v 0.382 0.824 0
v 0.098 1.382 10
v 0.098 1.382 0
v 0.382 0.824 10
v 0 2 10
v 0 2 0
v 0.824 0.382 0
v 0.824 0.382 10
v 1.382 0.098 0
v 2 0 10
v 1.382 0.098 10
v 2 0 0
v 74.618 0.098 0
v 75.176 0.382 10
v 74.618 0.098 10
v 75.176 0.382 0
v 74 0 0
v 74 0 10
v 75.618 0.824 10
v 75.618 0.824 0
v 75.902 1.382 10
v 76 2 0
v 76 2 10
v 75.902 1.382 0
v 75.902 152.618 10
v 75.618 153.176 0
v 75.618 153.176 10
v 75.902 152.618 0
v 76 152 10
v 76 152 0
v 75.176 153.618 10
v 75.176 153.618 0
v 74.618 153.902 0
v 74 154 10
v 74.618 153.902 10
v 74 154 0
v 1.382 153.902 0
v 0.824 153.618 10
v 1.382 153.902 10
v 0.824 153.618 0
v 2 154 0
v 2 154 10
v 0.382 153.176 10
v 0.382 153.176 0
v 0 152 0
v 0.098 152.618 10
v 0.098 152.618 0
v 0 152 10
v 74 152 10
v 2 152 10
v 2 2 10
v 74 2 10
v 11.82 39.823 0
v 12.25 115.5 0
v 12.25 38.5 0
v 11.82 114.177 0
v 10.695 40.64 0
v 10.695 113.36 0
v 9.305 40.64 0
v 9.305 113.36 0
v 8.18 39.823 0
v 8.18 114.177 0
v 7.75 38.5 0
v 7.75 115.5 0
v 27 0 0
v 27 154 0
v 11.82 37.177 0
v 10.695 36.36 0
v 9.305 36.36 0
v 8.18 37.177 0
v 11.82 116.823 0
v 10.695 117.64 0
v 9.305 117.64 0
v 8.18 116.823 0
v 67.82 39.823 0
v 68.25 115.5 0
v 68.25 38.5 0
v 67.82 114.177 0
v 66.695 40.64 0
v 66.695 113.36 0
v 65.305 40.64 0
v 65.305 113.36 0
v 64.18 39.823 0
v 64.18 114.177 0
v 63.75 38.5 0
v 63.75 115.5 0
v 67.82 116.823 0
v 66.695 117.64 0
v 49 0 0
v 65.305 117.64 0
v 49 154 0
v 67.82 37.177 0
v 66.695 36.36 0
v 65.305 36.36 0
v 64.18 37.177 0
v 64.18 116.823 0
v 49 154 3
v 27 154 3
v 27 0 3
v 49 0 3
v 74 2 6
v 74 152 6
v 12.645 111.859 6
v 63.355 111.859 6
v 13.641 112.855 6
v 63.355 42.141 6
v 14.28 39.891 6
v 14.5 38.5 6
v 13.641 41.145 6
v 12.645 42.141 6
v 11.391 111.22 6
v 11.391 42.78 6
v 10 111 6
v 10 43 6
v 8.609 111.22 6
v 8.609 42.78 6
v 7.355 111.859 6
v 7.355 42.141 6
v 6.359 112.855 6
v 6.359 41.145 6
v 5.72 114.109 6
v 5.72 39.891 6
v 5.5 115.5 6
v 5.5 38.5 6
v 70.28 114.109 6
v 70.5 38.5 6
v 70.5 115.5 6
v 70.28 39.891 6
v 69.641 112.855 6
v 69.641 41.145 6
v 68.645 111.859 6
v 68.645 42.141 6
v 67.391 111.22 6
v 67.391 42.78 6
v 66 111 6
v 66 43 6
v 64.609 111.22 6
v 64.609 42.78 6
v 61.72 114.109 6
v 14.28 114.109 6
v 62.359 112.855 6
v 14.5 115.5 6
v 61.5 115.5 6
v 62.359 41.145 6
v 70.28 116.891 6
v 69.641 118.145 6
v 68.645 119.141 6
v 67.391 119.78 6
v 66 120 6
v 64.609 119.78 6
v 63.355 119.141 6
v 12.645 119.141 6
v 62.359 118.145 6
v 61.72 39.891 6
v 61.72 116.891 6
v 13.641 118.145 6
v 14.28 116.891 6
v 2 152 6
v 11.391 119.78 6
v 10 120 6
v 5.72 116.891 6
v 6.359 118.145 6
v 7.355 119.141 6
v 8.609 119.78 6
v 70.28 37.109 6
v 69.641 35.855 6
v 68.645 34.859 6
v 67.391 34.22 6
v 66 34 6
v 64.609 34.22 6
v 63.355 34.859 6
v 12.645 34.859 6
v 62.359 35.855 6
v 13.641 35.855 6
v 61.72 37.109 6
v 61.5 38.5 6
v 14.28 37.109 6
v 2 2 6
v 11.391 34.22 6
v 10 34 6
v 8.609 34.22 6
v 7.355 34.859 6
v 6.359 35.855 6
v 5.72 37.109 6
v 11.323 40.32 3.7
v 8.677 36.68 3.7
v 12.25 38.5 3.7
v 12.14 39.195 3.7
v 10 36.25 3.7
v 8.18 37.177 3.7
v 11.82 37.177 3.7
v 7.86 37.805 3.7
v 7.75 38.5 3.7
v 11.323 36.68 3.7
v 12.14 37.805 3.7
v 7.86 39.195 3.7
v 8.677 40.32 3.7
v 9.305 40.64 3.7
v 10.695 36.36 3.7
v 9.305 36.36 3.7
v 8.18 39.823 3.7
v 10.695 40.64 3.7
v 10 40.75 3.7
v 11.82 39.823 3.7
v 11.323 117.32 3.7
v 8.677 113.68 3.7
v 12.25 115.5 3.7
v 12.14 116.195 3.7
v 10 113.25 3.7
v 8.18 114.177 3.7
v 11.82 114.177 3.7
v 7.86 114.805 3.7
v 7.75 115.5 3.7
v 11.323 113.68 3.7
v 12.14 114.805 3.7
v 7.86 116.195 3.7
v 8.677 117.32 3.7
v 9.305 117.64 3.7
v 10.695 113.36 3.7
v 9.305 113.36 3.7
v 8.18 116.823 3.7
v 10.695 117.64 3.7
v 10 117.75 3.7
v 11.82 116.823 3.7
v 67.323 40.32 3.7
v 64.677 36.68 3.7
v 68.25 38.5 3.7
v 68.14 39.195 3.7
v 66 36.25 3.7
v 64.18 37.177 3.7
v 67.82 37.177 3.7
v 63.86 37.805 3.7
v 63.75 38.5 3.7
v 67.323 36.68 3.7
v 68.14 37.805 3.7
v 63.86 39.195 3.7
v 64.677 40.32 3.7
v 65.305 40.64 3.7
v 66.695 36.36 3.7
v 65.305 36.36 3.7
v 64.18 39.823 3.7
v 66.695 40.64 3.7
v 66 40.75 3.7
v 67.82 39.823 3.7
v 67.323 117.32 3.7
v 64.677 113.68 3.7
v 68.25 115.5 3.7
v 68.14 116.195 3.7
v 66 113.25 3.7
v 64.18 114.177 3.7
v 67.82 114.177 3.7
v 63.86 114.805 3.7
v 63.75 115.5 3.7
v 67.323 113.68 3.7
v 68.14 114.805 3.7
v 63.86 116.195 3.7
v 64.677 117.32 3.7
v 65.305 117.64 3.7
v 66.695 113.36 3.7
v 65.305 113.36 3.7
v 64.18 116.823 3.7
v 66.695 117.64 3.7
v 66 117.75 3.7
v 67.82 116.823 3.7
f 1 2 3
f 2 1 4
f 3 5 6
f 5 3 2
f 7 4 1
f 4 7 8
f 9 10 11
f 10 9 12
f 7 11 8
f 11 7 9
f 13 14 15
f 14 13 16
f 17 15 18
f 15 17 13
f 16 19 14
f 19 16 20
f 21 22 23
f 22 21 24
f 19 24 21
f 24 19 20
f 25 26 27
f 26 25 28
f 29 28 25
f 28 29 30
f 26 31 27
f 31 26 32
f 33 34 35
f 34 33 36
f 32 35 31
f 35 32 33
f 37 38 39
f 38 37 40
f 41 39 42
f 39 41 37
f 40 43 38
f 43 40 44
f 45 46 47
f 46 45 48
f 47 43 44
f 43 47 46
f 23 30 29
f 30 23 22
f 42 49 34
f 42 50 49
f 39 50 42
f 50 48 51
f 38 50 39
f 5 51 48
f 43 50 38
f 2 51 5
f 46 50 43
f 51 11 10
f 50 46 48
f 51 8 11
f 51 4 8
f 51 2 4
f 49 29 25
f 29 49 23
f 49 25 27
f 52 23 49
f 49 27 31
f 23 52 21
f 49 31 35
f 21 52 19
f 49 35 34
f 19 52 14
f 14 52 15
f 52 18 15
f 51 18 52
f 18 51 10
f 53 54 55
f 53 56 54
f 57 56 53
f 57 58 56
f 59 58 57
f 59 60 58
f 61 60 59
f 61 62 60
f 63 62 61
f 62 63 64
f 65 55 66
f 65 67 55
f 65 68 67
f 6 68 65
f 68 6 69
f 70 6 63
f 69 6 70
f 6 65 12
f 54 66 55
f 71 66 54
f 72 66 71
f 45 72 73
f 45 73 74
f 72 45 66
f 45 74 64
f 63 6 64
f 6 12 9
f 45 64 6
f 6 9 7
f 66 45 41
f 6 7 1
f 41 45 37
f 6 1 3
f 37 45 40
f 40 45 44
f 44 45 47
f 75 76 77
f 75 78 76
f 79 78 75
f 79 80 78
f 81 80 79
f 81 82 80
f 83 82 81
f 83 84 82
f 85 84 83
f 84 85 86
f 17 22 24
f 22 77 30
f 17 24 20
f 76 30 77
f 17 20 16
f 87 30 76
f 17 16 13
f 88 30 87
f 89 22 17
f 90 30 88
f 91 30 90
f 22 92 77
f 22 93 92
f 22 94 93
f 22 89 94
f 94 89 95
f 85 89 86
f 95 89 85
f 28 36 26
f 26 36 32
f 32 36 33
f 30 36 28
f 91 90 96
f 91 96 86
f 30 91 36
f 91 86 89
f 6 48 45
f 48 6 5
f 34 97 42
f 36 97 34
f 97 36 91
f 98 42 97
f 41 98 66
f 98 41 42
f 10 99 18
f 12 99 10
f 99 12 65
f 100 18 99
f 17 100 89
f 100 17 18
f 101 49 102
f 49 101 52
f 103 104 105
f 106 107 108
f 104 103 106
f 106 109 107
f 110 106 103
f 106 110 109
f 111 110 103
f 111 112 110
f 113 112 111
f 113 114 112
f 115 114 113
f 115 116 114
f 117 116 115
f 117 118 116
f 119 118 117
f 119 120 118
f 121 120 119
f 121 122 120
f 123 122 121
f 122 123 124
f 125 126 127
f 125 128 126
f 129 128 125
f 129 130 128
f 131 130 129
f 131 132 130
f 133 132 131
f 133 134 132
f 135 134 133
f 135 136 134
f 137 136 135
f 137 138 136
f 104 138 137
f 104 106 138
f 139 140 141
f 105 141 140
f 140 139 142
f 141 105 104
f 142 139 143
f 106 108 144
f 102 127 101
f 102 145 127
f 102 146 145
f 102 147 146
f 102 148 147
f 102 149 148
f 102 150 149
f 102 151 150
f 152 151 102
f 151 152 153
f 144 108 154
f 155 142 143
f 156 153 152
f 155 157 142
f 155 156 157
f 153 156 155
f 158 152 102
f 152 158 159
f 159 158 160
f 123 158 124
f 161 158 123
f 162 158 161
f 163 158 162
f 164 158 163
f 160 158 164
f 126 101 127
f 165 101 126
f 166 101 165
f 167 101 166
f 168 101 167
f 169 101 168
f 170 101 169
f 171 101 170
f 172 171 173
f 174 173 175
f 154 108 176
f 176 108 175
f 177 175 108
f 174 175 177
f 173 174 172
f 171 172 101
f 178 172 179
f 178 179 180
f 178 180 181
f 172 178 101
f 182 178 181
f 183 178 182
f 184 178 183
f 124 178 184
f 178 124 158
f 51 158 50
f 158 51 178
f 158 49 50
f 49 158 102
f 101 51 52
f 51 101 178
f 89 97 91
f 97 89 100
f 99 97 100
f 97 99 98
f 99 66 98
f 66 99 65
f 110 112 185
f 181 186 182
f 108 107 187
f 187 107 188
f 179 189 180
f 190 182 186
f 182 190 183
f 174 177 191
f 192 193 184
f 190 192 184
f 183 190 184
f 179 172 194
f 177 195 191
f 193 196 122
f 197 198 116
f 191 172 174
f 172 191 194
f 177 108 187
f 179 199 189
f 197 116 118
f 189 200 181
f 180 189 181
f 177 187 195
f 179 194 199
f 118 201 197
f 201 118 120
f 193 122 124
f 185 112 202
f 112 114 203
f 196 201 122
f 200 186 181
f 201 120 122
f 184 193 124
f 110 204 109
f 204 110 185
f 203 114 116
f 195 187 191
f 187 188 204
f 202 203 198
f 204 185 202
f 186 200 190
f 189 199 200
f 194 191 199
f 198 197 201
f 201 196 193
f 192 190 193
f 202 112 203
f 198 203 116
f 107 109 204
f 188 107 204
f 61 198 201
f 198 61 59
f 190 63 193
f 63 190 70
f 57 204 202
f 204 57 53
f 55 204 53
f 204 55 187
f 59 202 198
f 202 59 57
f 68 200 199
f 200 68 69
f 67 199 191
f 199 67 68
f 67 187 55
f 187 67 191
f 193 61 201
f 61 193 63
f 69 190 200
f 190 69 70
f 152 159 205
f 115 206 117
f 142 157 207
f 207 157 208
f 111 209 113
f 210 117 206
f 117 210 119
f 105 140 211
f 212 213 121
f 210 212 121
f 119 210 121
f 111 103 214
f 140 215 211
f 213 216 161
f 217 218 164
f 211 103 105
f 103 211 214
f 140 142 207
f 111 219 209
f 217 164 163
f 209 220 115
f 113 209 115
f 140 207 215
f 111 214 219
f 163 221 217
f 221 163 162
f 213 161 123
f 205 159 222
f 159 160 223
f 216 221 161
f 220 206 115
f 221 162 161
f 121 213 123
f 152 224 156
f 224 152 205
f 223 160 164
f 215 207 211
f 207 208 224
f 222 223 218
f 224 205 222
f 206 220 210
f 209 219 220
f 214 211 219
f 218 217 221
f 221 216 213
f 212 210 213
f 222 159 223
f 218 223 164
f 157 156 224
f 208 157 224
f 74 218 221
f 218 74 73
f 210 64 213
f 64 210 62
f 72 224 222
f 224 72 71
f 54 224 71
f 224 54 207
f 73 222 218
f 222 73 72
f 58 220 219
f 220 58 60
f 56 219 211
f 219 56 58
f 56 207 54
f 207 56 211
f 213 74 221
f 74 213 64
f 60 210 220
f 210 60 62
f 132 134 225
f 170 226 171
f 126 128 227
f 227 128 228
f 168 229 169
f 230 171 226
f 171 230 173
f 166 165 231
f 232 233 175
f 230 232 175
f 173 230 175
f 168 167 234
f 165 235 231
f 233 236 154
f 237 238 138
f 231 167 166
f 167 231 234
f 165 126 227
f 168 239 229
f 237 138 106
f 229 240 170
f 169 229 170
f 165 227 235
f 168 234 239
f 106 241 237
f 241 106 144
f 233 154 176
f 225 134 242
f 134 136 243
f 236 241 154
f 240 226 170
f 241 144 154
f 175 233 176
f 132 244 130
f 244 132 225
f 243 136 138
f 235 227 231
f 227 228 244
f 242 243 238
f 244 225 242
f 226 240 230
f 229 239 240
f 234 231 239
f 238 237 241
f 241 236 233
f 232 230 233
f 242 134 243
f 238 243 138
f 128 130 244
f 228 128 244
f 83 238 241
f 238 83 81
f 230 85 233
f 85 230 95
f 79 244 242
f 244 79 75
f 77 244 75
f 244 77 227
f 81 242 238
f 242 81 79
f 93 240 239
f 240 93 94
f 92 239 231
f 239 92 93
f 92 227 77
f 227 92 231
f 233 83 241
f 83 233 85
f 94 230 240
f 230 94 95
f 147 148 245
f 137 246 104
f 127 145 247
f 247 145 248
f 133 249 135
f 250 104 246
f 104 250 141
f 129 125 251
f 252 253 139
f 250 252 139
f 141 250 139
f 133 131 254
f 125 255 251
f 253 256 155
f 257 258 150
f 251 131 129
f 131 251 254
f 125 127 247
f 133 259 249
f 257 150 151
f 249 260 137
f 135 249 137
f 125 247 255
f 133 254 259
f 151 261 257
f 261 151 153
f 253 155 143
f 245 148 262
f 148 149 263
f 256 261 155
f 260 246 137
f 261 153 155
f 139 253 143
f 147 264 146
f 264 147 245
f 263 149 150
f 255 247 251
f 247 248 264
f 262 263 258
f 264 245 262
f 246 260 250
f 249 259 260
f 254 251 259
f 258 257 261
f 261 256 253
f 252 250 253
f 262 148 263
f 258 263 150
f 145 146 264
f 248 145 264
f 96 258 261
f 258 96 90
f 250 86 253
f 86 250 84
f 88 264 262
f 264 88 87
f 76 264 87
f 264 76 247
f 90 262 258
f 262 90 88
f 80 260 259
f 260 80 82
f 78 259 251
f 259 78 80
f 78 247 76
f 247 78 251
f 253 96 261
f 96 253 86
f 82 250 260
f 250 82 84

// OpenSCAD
// file: modules/Modules.scad
/***************************************
*   Purpose:	Regular use modules
***************************************/

//screwHole();
module screwHole(screwHole=4.5, screwDepth = 10, screwHead = 9, headTaper = 2.3, screwHeadDepth = 5){
	// Common size screws
	
    translate([0,0,-headTaper])cylinder(d1=screwHole, d2=screwHead, h = headTaper, $fn=20);
    translate([0,0,-headTaper-screwDepth])cylinder(d=screwHole, h=screwDepth, $fn=10);
    translate([0,0,-headTaper-screwDepth])cylinder(d=screwHole, h=screwDepth, $fn=10);
    translate([0,0,0]) cylinder(d=screwHead, h=screwHeadDepth, $fn=10);
}

//roundedCube(x=50, y=30, z=20, r=5, xyz="x");
//roundedCube(x=50, y=30, z=20, r=5, xyz="y");
//roundedCube(x=50, y=30, z=20, r=5, xyz="z");
//roundedCube(x=50, y=30, z=20, r=5, xyz="all");
//roundedCylinder(d=200, h=100, r=5);
module roundedCube(x=50, y=30, z=20, r=5, xyz="z"){
	hull(){
		if (xyz == "z") {
			translate([r,r,0])cylinder(h=z, r=r);
			translate([x-r,r,0])cylinder(h=z, r=r);
			translate([r,y-r,0])cylinder(h=z, r=r);
			translate([x-r,y-r,0])cylinder(h=z, r=r);
		} else if (xyz == "y") {
			translate([r,0,r])rotate([-90,0,0])cylinder(h=y, r=r);
			translate([x-r,0,r])rotate([-90,0,0])cylinder(h=y, r=r);
			translate([r,0,z-r])rotate([-90,0,0])cylinder(h=y, r=r);
			translate([x-r,0,z-r])rotate([-90,0,0])cylinder(h=y, r=r);
		} else if (xyz == "x") {
			translate([0,r,r])rotate([0,90,0])cylinder(h=x, r=r);
			translate([0,y-r,r])rotate([0,90,0])cylinder(h=x, r=r);
			translate([0,r,z-r])rotate([0,90,0])cylinder(h=x, r=r);
			translate([0,y-r,z-r])rotate([0,90,0])cylinder(h=x, r=r);
		} else if (xyz == "all") {
			minkowski(){
				translate([r,r,r])cube([x-r*2,y-r*2,z-r*2]);
				sphere(r=r);
			}			
		} else { 
			echo("XYZ not set");
		}
	}
}

//roundedCylinder(d=200, h=100, r=5);
//difference(){roundedCylinder();filletedCylinder();}
module roundedCylinder(d=200, h=100, r=5){
	hull(){
		translate([0,0,r])rotate_extrude()translate([d/2-r,0,0])circle(r=r);
		translate([0,0,h-r])rotate_extrude()translate([d/2-r,0,0])circle(r=r);
	}
}

//filletedCylinder();
//filletedCylinder(d=10, h=20, tr=1, br=1, pad=.1, s=60);
module filletedCylinder(d=50, h=100, tr=10, br=5, pad=5, s=30){
	$fn = s;
	shift = .1;
	//r=5;
	translate([0,0,-shift])cylinder(h=h+shift*2, r=d/2);
	if ( br > 0 ){
		// bottom
		translate([0,0,-shift])
			difference(){
				rotate_extrude()translate([d/2-pad,0,0])square([br+pad, br]);
				rotate_extrude()translate([d/2+br,br,0])circle(r=br);
			}
	}
	if ( tr > 0 ){
		// top
		translate([0,0,h-tr+shift])
			difference(){
				rotate_extrude()translate([d/2-pad,0,0])square([tr+pad, tr]);
				rotate_extrude()translate([d/2+tr,0,0])circle(r=tr);
			}
	}
}

module CylinderFillet(){
}
// file: modules/RoundedCube.scad
$fn = 20;

module roundedsquare(x=20, y=20, z=20, radius=3) {
	difference(){
		cube([x,y,z]);
		translate([0,0,0]) rotate([0,0,0]) fillet(radius,z);
		translate([x,0,0]) rotate([0,0,90]) fillet(radius,z);
		translate([x,y,0]) rotate([0,0,180]) fillet(radius,z);
		translate([0,y,0]) rotate([0,0,270]) fillet(radius,z);	
	}
}

module roundedcube(x=20, y=20, z=20, radius=3) {
	difference(){
		cube([x,y,z]);
		// fillet along z axis
		translate([0,0,0]) rotate([0,0,0]) fillet(radius,z);
		translate([x,0,0]) rotate([0,0,90]) fillet(radius,z);
		translate([x,y,0]) rotate([0,0,180]) fillet(radius,z);
		translate([0,y,0]) rotate([0,0,270]) fillet(radius,z);
		// fillet along x axis
		translate([0,0,0]) rotate([90,0,90]) fillet(radius,z);
		translate([0,0,z]) rotate([90,90,90]) fillet(radius,z);
		translate([0,y,z]) rotate([90,180,90]) fillet(radius,z);
		translate([0,y,0]) rotate([90,270,90]) fillet(radius,z);
		// fillet along y axis
		translate([0,0,0]) rotate([-90,270,0]) fillet(radius,z);
		translate([x,0,0]) rotate([-90,180,0]) fillet(radius,z);
		translate([x,0,z]) rotate([-90,90,0]) fillet(radius,z);
		translate([0,0,z]) rotate([-90,0,0]) fillet(radius,z);
	}
}

module fillet(radius = 1, height = 1){
    translate([radius, radius, -1]) rotate([0,0,180])
        difference(){
            cube([radius + 1, radius + 1, height + 2]);
            cylinder(r = radius, h = height + 2);
        }
}

//roundedsquare();
// main file
/*************************************************************************************

	Name:					PowerBrickMount
	Purpose:			Use velcro straps to mount power bricks to a surface
	
	Version History:
	- 01/20/2025	Can now add a lip to hold object in place.
								Will now add 2 screws on a side for wider objects.
	
*************************************************************************************/

include <modules/RoundedCube.scad>
include <modules/Modules.scad>

screwSide = 154;				// If you add a lip, be sure to add 2x that to this
velcroSide = 76;				// If you add a lip, be sure to add 2x that to this
velcroWidth = 22;				// Width of ths lot for the velcro
velcroThick = 3;				// Height of the slot for the velcro
withLip = true;					// Enable or disable the lip
lipWidth = 2;						// How wide is the lip if enabled?
lipHeight = 4;					// How tall is the lip if enabled?

// These should not need to be modified much if at all
thickness = 6;					// Object thickness (velcroThick +3 is good, less is flimsy)
cornerRadius = 2;				// Roundness of corner
screwInset = 10;				// How far inset from the edge
screwThreshold = 80;		// One screw per side below and two above
velcroIndent = 20;			// Based on the thickness of the velcro
velcroThreshold = .2;		// Decimial value of percent.  Defualt = .2 or 20%

// Calculations
velcroPct = velcroWidth/velcroSide;
echo(velcroPct);


difference(){
	// Will if have a lip or not
	if (!withLip) {
		// Without lip
		roundedsquare(x=velcroSide, y=screwSide, z=thickness, radius=cornerRadius);
	} else {
		// With lip
		difference(){
			// Create upper block to cut from
			roundedsquare(x=velcroSide, y=screwSide, z=thickness + lipHeight, radius=cornerRadius);
			// Remove lip
			translate([lipWidth,lipWidth,thickness])roundedsquare(x=velcroSide-2*lipWidth, y=screwSide-2*lipWidth, z=thickness + lipHeight, radius=0);
		}
	}
	
	// Remove gap for velcro straps
	// If to determine if 1 or 2 velcro straps (based on velcroThreshold.
	if (velcroPct > velcroThreshold) {
		#translate([(velcroSide-velcroWidth)/2,-1,0])roundedsquare(x=velcroWidth, y=screwSide+2, z=velcroThick, radius=1);
	} else {
		#translate([velcroIndent,-1,0])roundedsquare(x=velcroWidth, y=screwSide+2, z=velcroThick, radius=1);
		#translate([velcroSide-velcroIndent-velcroWidth,-1,0])roundedsquare(x=velcroWidth, y=screwSide+2, z=velcroThick, radius=1);		
	}
	
	// Determine if 1 or 2 screws per side
	if (screwSide <= screwThreshold) {
		// Left screw hole
		#translate ([screwInset,screwSide/2,thickness])screwHole(screwHole=4.5, screwDepth = 10, screwHead = 9, headTaper = 2.3, screwHeadDepth = 5);
		// Right screw hole
		#translate ([velcroSide-screwInset,screwSide/2,thickness])screwHole(screwHole=4.5, screwDepth = 10, screwHead = 9, headTaper = 2.3, screwHeadDepth = 5);
	} else {
		// Left screw hole closer to x axis
		#translate ([screwInset,screwSide/4,thickness])screwHole(screwHole=4.5, screwDepth = 10, screwHead = 9, headTaper = 2.3, screwHeadDepth = 5);
		// Left screw hole further from x axis
		#translate ([screwInset,screwSide/4*3,thickness])screwHole(screwHole=4.5, screwDepth = 10, screwHead = 9, headTaper = 2.3, screwHeadDepth = 5);
		// Right screw holes closer to x axis
		#translate ([velcroSide-screwInset,screwSide/4,thickness])screwHole(screwHole=4.5, screwDepth = 10, screwHead = 9, headTaper = 2.3, screwHeadDepth = 5);
		// Right screw holes further from x axis
		#translate ([velcroSide-screwInset,screwSide/4*3,thickness])screwHole(screwHole=4.5, screwDepth = 10, screwHead = 9, headTaper = 2.3, screwHeadDepth = 5);
	}
}
